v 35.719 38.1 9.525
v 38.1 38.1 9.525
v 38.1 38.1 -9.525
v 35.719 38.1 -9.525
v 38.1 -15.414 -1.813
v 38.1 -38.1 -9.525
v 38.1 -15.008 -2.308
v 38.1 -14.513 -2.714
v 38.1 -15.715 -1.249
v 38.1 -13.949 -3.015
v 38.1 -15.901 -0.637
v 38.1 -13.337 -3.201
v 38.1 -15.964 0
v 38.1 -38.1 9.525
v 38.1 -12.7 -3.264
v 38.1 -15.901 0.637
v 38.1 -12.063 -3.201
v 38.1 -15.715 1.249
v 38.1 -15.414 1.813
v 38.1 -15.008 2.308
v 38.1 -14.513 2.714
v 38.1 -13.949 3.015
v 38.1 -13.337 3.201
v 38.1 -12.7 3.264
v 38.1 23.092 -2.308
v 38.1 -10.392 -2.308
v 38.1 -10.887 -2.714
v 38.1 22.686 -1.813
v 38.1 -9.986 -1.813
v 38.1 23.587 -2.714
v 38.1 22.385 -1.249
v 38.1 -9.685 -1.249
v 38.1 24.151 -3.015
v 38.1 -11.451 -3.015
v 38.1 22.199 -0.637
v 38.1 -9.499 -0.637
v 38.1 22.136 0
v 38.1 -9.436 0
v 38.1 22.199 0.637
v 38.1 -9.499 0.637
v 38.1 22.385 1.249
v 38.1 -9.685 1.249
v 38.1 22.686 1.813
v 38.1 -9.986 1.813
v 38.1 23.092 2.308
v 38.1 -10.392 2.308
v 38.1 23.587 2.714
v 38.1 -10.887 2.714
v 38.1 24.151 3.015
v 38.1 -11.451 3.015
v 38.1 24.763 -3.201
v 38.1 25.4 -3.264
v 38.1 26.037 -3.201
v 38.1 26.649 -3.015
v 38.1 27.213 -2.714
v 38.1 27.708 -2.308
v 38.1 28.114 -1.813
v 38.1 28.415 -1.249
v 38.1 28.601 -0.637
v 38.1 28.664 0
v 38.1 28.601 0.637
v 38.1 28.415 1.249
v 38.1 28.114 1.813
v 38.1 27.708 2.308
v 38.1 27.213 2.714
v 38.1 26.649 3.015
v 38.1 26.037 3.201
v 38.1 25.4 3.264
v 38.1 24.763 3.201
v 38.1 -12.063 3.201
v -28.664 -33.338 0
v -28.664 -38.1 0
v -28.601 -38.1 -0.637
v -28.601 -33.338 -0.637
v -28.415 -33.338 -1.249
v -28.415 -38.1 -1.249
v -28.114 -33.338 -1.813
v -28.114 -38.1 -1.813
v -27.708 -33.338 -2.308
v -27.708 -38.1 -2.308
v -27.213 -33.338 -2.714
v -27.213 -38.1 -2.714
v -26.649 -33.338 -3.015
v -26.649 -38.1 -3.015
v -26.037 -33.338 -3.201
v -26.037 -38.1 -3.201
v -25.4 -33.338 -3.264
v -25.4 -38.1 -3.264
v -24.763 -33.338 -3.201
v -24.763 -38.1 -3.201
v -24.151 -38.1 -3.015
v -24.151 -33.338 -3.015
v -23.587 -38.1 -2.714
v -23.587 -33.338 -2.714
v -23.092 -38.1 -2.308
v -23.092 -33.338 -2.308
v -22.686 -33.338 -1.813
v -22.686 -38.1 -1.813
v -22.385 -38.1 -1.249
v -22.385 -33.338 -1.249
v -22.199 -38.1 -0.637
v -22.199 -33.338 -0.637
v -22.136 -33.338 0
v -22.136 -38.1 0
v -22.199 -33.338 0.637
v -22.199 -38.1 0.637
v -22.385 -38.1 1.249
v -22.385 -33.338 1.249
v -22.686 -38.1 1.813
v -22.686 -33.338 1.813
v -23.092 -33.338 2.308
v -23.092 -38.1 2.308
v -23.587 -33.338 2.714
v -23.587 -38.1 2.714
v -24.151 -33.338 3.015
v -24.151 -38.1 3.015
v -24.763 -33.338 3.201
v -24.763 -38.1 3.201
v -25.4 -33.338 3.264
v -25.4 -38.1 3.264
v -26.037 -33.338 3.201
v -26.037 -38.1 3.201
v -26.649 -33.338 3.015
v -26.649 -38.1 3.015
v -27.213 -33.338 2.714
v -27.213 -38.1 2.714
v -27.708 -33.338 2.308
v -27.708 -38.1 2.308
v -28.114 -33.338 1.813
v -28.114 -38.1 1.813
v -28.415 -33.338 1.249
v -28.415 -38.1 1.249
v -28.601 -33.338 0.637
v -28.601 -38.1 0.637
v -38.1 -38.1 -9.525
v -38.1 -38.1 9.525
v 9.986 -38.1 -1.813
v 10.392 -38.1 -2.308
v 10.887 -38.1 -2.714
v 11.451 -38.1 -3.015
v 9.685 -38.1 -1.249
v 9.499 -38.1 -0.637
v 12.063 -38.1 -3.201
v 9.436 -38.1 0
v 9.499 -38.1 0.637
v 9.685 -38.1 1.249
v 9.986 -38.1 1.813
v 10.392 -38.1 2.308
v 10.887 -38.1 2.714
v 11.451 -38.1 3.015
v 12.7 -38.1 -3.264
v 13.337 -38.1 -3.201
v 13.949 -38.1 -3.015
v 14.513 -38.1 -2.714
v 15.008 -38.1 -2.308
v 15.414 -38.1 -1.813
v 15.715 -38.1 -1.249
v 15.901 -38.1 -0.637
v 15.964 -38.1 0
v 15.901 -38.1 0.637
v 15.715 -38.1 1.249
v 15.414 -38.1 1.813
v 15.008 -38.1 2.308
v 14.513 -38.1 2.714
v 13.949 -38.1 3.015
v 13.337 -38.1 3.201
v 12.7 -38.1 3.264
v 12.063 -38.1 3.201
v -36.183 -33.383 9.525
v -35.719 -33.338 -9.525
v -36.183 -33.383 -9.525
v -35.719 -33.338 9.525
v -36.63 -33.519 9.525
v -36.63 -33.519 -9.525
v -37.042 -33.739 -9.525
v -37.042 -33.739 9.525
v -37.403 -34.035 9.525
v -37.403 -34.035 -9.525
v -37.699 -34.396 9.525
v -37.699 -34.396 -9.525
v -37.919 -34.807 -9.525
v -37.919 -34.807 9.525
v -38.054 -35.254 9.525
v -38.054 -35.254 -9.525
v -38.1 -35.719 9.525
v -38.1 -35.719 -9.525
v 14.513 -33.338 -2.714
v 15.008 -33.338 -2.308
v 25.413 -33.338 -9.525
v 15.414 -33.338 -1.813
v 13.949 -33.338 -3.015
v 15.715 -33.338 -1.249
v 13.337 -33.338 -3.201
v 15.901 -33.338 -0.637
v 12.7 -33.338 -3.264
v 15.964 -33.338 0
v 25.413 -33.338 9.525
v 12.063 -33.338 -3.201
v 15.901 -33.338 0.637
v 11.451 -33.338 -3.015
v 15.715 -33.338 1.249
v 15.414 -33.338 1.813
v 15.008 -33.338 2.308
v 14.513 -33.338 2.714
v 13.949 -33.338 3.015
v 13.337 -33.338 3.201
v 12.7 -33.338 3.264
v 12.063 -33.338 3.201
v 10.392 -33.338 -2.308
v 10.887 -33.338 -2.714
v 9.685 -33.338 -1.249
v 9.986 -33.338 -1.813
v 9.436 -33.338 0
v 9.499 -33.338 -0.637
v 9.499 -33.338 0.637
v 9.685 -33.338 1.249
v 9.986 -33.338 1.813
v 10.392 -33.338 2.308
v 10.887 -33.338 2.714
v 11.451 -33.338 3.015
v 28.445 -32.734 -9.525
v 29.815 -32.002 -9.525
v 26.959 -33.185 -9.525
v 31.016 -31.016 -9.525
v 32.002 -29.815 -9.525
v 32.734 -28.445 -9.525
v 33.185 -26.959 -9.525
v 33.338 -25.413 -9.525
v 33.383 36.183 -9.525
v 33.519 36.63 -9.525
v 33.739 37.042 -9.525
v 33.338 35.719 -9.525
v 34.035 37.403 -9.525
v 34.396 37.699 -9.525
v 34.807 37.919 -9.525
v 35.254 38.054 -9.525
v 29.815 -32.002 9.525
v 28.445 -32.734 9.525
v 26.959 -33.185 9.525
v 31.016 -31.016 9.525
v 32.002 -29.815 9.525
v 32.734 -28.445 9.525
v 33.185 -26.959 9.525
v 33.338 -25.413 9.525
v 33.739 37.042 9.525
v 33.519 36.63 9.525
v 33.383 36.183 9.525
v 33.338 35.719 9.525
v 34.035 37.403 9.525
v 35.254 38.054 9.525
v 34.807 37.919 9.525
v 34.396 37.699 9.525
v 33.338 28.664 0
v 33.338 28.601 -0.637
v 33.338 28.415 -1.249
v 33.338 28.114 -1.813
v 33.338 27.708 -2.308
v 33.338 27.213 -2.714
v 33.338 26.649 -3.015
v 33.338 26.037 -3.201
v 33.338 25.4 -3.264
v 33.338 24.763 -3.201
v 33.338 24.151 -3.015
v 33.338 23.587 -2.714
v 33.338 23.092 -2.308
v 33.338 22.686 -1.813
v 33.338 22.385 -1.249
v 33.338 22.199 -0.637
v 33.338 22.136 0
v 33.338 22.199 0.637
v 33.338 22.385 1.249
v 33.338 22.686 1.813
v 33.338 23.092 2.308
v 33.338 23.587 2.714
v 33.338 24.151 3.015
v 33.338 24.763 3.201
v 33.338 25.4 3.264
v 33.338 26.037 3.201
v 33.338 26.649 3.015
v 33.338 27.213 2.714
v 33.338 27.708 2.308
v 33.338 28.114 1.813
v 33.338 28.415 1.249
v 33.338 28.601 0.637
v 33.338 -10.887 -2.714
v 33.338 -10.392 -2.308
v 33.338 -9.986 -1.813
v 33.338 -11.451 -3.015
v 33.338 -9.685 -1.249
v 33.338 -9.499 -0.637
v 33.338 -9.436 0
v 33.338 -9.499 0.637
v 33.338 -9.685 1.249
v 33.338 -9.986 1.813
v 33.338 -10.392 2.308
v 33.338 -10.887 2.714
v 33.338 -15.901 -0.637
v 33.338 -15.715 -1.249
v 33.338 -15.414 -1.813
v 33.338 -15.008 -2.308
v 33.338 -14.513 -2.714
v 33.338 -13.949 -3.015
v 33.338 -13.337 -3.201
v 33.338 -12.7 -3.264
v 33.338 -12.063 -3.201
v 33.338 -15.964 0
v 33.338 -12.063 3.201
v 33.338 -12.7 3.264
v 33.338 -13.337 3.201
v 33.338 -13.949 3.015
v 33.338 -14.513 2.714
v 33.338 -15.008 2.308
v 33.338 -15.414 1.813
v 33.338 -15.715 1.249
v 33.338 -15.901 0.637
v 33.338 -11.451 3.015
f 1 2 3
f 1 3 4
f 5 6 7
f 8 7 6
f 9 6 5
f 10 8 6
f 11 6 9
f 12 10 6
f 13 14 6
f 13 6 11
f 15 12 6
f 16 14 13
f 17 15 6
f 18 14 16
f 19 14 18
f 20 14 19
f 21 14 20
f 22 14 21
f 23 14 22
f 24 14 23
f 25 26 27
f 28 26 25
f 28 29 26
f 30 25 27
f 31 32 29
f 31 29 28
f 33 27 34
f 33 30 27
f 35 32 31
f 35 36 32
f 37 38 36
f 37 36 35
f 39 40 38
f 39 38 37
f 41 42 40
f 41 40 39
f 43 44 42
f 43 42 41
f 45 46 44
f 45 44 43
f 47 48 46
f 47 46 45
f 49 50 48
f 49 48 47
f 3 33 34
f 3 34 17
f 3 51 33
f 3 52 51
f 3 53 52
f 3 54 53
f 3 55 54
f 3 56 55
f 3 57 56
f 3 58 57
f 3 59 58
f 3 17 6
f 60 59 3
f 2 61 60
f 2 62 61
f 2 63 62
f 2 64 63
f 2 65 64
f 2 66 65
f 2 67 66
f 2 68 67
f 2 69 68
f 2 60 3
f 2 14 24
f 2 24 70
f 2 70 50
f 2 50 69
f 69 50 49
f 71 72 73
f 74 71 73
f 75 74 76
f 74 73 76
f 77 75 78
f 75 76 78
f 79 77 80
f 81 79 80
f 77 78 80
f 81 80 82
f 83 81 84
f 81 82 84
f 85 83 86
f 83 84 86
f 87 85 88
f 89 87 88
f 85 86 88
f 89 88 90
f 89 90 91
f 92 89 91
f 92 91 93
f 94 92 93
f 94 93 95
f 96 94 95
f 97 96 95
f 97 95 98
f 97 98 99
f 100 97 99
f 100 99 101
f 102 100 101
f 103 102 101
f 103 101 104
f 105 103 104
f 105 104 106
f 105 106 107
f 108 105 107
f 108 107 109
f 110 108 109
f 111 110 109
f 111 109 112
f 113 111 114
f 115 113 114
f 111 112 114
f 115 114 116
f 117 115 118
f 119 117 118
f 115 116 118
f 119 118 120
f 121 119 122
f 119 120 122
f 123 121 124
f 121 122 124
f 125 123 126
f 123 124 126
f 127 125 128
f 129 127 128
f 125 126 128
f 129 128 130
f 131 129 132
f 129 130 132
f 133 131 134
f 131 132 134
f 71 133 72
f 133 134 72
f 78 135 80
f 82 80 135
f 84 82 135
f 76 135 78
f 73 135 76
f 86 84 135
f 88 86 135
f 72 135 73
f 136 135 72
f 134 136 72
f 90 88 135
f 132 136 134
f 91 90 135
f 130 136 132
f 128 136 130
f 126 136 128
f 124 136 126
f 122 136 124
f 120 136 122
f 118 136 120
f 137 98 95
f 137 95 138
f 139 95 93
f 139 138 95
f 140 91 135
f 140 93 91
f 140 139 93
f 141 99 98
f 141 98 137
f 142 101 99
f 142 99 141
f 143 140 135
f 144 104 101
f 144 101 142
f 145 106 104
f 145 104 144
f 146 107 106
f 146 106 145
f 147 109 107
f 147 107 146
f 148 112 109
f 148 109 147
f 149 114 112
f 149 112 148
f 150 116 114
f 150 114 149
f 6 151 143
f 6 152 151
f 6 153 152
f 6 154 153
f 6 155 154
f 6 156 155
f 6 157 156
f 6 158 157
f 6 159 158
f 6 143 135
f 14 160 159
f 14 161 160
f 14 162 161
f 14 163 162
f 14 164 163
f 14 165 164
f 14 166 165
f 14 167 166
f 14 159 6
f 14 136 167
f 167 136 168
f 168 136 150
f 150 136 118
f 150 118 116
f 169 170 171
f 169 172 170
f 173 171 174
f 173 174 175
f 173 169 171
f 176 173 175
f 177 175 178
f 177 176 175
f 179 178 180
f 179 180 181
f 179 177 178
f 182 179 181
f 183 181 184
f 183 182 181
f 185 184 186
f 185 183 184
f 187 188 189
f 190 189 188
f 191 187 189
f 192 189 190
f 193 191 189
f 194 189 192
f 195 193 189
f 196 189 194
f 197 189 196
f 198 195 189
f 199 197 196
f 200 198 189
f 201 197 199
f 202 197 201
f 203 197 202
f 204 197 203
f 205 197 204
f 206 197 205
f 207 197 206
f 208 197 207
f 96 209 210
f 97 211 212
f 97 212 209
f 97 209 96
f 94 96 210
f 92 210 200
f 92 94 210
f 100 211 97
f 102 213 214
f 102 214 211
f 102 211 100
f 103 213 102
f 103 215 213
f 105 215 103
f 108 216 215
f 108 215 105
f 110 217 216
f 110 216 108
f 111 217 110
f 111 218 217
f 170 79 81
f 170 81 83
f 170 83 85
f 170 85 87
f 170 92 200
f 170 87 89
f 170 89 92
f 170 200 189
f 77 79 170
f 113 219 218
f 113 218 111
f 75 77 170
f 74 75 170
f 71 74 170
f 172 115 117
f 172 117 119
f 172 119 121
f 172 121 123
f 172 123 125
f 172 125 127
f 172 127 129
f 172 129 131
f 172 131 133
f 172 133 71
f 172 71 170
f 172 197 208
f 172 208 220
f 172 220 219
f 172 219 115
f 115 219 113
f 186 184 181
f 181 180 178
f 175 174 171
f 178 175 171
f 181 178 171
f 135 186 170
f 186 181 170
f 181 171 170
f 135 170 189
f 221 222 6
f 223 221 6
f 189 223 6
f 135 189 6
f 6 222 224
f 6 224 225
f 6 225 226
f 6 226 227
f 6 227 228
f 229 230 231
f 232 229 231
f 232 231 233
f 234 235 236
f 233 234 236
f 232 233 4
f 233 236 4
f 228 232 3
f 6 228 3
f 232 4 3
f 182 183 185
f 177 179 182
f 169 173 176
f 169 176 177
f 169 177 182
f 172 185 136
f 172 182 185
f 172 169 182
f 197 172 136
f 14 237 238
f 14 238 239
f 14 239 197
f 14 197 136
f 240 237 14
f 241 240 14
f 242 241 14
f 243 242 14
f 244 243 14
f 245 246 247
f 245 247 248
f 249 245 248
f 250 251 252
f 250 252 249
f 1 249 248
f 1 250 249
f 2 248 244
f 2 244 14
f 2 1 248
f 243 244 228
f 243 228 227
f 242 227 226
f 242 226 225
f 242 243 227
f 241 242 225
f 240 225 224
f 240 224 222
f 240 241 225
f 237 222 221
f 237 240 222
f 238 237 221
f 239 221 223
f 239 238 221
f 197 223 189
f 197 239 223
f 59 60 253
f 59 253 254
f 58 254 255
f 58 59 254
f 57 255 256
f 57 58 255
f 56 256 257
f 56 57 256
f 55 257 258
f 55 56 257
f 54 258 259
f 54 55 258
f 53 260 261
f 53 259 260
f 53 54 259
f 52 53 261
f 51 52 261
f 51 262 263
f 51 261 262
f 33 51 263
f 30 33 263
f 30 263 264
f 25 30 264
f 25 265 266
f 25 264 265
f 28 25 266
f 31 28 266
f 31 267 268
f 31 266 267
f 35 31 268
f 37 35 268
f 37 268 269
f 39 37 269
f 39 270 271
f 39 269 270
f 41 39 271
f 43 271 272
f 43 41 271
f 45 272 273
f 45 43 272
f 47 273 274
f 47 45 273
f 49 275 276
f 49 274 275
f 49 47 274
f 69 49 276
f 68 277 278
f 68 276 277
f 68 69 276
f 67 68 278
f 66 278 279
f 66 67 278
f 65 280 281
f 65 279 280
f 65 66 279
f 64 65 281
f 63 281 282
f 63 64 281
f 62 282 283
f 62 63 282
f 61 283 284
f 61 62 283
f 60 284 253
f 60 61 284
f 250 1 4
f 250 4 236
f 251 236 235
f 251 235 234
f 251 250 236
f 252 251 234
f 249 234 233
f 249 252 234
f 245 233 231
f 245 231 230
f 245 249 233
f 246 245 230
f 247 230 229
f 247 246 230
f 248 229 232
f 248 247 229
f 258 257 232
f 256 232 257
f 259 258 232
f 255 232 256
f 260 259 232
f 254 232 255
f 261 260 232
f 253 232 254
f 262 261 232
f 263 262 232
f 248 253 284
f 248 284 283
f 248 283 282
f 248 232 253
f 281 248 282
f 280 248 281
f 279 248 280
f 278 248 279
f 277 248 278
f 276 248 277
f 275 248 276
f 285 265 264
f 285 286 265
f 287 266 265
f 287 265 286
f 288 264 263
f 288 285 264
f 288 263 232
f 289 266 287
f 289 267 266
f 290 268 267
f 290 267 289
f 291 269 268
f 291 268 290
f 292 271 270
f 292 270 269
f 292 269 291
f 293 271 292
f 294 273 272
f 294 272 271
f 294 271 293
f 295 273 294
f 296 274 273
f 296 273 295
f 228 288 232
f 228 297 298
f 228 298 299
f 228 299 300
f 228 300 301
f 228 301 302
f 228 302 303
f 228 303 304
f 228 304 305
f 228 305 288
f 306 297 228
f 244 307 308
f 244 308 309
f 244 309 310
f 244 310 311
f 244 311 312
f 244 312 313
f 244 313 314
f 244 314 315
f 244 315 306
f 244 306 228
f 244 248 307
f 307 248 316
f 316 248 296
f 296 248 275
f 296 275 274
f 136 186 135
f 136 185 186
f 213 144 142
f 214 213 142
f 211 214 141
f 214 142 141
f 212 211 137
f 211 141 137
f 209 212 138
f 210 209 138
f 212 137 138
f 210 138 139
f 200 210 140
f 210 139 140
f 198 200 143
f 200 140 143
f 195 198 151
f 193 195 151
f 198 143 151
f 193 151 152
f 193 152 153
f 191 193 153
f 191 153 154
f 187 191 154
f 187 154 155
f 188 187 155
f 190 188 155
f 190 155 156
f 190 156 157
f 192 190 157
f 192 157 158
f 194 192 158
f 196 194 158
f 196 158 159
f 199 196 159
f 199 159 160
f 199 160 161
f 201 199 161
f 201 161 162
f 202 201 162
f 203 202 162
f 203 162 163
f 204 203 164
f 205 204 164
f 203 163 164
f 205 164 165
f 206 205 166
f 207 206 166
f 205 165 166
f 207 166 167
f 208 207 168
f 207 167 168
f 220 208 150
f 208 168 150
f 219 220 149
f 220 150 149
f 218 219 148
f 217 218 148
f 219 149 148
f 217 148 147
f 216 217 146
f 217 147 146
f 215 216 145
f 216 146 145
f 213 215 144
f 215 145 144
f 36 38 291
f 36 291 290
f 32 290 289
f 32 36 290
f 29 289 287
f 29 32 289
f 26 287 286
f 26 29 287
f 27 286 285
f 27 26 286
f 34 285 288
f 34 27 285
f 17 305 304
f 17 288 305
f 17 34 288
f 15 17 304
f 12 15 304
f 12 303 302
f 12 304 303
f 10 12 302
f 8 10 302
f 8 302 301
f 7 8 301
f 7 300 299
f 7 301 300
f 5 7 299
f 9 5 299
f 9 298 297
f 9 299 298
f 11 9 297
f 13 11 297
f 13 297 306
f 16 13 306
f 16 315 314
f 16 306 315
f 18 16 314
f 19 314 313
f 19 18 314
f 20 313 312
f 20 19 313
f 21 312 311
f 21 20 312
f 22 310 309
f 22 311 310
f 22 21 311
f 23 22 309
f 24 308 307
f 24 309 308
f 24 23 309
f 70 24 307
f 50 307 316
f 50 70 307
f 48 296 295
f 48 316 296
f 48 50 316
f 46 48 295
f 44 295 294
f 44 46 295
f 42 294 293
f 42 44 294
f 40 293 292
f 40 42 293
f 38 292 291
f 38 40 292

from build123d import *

# Parameters (mm, degrees)
BOSS_EXTRUDE1_DEPTH      = 9.525
F_0_257_DIAMETER_HOLE1_D = 6.5278


with BuildPart() as part:
    # Sketch2 → Boss-Extrude1 (new, symmetric)
    with BuildSketch(Plane.XY):
        with BuildLine():
            Line((-38.1, -38.1), (38.1, -38.1))
            Line((38.1, -38.1), (38.1, 38.1))
            Line((38.1, 38.1), (35.71875, 38.1))
            ThreePointArc((35.71875, 38.1), (34.034951977, 37.402548023), (33.3375, 35.71875))
            Line((33.3375, 35.71875), (33.3375, -25.4127))
            ThreePointArc((33.3375, -25.4127), (31.01637982, -31.01637982), (25.4127, -33.3375))
            Line((25.4127, -33.3375), (-35.71875, -33.3375))
            ThreePointArc((-35.71875, -33.3375), (-37.402548023, -34.034951977), (-38.1, -35.71875))
            Line((-38.1, -35.71875), (-38.1, -38.1))
        make_face()
    extrude(amount=BOSS_EXTRUDE1_DEPTH, both=True)

    # F (0.257) Diameter Hole1 (through all)
    with Locations(Plane(origin=(0, -33.3375, 0), x_dir=(1, 0, 0), z_dir=(0, 1, 0))):
        with Locations((12.7, 0), (-25.4, 0)):
            f_0_257_diameter_hole1 = Hole(F_0_257_DIAMETER_HOLE1_D / 2)

    # Mirror1: F (0.257) Diameter Hole1 across plane
    add(f_0_257_diameter_hole1.mirror(Plane(origin=(0, 0, 0), x_dir=(0, 0, 1), z_dir=(0.7071067811865474, 0.7071067811865478, 0))), mode=Mode.SUBTRACT)


solid = part.part
